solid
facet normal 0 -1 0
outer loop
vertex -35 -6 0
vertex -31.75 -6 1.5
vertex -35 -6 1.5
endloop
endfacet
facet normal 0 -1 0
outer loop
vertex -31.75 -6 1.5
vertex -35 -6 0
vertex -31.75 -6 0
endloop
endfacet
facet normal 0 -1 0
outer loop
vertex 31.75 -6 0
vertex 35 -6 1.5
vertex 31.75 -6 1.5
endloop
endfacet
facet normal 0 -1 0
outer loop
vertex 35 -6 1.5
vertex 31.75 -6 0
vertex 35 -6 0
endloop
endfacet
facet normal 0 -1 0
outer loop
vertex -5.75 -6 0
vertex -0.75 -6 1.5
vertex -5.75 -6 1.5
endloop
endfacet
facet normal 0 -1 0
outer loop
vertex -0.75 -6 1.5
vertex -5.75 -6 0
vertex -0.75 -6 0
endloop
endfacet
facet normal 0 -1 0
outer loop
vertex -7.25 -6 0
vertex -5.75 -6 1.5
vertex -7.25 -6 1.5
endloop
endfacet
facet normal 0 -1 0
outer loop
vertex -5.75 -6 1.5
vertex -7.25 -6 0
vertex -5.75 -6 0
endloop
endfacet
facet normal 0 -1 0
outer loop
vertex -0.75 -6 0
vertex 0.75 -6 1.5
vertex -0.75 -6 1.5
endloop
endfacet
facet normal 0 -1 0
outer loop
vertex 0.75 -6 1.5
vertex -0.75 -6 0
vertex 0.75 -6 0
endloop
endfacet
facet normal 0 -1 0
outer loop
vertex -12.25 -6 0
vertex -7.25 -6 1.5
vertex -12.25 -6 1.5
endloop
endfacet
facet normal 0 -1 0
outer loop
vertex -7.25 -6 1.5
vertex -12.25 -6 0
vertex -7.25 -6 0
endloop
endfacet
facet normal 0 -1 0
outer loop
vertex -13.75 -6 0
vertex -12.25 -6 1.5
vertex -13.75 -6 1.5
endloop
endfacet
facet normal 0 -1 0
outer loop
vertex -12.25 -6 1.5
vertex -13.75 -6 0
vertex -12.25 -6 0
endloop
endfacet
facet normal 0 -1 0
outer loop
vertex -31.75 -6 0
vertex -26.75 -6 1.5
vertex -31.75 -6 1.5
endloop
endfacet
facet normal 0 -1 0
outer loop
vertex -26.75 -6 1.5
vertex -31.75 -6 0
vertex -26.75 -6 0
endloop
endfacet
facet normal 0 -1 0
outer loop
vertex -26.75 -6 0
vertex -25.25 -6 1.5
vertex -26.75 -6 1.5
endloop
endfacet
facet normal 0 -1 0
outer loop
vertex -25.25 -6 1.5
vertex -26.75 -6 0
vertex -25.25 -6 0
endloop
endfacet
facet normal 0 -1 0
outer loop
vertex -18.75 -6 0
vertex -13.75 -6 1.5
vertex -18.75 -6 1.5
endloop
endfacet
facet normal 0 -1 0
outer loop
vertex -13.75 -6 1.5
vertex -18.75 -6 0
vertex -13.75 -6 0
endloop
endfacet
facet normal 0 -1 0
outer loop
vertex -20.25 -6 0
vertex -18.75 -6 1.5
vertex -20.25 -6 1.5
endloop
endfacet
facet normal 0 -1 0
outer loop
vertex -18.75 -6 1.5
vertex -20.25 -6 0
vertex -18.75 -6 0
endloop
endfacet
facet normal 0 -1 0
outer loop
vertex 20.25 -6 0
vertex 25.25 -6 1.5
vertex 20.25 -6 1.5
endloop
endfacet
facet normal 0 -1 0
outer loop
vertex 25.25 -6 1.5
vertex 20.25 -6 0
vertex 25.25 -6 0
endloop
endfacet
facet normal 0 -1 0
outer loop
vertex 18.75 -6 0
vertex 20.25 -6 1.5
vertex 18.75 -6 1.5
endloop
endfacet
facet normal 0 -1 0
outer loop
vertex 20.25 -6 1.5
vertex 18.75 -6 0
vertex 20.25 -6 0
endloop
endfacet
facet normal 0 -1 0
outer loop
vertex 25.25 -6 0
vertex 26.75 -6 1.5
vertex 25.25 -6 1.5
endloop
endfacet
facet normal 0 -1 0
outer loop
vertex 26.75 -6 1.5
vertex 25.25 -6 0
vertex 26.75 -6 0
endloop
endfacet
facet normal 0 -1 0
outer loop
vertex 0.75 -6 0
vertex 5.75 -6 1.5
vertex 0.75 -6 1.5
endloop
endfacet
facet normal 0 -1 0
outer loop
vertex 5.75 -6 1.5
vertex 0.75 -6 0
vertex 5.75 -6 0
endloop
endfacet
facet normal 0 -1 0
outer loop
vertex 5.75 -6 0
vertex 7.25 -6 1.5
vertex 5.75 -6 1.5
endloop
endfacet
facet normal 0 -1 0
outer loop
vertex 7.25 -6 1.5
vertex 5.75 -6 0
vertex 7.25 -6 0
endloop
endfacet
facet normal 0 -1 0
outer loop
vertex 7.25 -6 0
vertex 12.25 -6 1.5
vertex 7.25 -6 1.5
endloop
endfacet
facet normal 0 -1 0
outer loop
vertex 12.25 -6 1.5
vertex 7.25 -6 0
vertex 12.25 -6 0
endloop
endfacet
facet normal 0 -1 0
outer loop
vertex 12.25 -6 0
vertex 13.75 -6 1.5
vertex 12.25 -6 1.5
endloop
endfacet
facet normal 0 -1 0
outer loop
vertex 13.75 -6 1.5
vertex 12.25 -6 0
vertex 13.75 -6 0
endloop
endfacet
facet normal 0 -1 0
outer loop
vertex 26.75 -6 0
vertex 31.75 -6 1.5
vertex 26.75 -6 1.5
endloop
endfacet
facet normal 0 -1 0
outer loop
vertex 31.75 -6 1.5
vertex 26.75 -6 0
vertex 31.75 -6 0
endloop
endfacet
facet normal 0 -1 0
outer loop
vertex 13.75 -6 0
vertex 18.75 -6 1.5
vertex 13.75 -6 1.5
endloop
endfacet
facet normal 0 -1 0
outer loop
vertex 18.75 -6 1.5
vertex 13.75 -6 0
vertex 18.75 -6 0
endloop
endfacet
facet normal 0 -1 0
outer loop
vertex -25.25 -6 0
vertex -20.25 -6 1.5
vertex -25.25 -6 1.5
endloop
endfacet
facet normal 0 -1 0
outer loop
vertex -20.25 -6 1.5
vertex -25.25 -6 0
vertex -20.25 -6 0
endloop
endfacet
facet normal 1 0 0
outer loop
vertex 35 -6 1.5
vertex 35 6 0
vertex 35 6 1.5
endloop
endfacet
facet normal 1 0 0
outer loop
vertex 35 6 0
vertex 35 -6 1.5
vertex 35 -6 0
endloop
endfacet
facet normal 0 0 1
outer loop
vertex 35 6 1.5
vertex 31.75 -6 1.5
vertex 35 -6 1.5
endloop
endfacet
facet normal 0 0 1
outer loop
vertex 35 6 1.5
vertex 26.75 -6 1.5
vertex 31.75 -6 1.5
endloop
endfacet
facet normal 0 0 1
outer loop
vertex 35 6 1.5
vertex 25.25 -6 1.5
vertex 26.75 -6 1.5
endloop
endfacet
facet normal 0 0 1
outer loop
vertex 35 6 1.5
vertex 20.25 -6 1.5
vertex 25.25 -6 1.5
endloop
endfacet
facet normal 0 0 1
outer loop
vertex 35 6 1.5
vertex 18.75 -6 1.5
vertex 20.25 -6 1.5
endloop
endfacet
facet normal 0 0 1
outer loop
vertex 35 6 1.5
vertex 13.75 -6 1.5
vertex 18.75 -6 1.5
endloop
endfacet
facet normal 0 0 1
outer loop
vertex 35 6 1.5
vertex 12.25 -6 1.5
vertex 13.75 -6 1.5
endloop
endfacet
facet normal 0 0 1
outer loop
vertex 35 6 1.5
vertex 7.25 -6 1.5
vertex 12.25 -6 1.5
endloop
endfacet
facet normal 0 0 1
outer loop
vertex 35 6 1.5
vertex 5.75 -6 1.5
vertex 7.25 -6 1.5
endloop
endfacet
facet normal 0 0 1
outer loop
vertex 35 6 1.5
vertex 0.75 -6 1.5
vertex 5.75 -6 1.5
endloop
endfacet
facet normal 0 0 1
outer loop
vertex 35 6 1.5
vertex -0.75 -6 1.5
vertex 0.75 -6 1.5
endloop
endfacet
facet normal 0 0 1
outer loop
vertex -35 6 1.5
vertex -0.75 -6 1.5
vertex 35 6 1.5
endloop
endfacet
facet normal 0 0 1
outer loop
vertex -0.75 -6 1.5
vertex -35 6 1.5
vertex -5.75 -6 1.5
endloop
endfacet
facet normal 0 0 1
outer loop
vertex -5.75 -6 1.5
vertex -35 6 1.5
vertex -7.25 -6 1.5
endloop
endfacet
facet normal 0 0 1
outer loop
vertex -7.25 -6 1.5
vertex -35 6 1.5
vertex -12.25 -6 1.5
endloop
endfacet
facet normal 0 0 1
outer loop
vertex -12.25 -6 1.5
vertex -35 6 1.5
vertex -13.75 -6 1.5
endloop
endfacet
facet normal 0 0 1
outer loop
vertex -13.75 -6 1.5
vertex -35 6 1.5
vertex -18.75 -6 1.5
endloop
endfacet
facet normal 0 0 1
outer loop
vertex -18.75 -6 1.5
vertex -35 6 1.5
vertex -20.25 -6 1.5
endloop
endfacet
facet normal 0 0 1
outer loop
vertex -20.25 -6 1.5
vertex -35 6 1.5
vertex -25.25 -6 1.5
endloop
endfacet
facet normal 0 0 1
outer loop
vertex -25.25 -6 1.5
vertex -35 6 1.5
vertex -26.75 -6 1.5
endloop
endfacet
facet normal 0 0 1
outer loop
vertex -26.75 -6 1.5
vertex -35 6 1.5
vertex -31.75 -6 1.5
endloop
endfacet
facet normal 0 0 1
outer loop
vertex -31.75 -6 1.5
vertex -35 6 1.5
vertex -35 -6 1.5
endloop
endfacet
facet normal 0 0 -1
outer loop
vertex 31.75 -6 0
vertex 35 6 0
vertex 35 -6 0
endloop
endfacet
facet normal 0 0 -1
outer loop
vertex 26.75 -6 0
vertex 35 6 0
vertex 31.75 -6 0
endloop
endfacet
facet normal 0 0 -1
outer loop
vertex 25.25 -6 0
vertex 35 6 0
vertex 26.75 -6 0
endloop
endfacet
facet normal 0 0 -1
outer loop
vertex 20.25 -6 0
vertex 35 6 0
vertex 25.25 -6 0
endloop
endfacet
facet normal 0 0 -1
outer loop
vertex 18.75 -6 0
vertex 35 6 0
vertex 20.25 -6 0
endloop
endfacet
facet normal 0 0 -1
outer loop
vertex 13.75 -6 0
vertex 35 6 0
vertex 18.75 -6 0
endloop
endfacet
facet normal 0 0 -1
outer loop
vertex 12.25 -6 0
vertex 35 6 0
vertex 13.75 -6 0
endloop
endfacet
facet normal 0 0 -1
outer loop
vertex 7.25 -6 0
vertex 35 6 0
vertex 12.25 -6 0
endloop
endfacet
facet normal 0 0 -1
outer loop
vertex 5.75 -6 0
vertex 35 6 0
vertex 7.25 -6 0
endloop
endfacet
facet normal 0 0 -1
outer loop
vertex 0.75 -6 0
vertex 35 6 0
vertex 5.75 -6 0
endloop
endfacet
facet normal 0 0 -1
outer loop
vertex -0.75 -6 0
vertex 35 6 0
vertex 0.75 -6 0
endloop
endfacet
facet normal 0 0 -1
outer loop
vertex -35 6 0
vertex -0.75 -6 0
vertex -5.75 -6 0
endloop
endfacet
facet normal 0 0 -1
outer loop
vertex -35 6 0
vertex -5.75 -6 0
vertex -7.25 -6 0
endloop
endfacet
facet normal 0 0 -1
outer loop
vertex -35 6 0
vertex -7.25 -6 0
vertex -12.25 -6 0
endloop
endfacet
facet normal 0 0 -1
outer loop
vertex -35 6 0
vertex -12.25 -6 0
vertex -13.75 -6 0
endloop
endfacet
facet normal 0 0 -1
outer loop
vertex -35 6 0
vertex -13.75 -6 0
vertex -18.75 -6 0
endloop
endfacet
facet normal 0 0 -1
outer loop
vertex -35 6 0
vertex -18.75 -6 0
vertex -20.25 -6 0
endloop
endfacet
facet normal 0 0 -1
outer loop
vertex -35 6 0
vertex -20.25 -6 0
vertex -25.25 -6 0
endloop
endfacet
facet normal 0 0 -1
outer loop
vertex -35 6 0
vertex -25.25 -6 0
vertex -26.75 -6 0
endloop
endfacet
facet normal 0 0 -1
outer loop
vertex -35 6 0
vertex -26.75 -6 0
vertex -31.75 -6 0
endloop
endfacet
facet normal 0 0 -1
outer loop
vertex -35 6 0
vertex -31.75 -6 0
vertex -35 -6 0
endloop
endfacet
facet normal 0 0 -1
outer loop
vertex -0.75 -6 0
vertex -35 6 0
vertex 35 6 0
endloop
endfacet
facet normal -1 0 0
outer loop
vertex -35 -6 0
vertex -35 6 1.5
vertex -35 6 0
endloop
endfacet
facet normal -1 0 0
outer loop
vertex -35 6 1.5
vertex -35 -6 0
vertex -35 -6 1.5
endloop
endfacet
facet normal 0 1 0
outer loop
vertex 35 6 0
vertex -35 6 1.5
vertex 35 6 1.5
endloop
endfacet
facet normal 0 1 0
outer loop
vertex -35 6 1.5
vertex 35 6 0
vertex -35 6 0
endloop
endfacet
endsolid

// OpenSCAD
// 10-well comb for agarose gel casting, printed lying flat
// Units: mm

$fn = 64;

// --- Plate ---
plate_len   = 70;   // spine length (X)
plate_wid   = 12;   // spine width (Y)
plate_thk   = 1.5;  // plate thickness (Z)

// --- Teeth ---
teeth_n     = 10;   // number of teeth
teeth_w     = 5.0;  // tooth width (X)
teeth_l     = 12;   // tooth length (Y)
teeth_gap   = 1.5;  // gap between teeth (X)

// Derived
teeth_total_w = (teeth_n - 1) * teeth_gap + teeth_n * teeth_w;  // row width in X
overhang      = (plate_len - teeth_total_w) / 2;                // centre offset

difference() {
    // Plate with spine
    translate([-plate_len / 2, -plate_wid / 2, 0])
        cube([plate_len, plate_wid, plate_thk]);

    // Teeth hanging in -Y from one long edge
    for (i = [0 : teeth_n - 1]) {
        translate([-plate_len / 2 + overhang + i * (teeth_w + teeth_gap),
                   -plate_wid / 2 - teeth_l,
                   0])
            cube([teeth_w, teeth_l, plate_thk]);
    }
}
